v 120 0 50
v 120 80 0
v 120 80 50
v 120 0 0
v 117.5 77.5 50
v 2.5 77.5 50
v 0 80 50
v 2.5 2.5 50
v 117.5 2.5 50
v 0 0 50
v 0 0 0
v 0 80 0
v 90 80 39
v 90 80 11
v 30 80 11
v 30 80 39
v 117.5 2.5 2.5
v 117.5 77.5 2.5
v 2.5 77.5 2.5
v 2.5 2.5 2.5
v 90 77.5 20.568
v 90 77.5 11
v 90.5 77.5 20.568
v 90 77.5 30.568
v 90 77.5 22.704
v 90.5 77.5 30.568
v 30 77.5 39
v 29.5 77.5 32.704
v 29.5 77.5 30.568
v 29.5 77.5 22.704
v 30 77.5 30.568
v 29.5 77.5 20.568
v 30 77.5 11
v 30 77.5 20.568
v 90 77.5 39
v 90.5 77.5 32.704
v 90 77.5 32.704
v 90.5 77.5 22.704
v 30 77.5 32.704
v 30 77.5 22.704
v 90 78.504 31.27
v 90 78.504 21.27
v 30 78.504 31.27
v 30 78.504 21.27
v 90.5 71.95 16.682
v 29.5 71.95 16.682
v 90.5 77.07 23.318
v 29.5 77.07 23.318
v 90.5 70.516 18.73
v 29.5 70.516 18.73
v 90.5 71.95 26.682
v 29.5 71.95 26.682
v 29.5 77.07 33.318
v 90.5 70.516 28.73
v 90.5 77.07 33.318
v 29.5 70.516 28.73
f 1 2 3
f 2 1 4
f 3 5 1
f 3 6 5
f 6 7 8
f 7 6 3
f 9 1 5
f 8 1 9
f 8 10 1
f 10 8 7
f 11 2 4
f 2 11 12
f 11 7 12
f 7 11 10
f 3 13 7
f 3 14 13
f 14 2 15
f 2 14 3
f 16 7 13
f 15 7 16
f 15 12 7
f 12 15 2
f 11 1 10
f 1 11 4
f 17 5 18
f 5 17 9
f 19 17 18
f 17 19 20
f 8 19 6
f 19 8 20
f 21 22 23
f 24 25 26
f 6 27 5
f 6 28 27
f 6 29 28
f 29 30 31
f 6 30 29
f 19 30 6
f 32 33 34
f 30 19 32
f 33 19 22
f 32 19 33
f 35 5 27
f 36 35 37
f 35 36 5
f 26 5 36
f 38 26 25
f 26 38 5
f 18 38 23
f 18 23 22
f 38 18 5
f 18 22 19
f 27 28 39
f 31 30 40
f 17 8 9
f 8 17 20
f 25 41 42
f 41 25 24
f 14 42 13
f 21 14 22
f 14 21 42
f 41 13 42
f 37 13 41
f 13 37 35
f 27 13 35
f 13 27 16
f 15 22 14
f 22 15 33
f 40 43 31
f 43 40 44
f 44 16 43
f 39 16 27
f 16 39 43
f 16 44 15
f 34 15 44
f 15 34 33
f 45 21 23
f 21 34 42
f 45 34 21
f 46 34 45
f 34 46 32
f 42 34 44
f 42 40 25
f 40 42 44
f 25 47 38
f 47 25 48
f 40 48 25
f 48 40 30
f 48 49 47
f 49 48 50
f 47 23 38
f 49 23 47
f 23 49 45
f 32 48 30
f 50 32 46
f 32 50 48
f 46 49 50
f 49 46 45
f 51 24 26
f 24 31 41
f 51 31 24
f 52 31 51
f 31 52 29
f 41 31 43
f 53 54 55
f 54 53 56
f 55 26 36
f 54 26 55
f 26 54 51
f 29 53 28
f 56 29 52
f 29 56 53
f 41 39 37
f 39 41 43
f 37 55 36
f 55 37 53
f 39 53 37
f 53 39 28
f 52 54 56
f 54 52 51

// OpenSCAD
$fn = 32;

// ----------------------------------------------------------------------
// Vent box: louvers enclosure
// ----------------------------------------------------------------------

// --- parameters (mm) ---
box_l = 120;              // box length, X
box_w = 80;               // box width, Y
box_h = 50;               // box height, Z
wall_t = 2.5;             // shell wall thickness
win_l = 60;               // vent window width, X
win_h = 28;               // vent window height, Z
slat_t = 2.5;             // louver slat thickness
slat_d = 8;               // louver slat depth
slat_a = 35;              // louver slat angle, degrees
slat_pitch = 10;          // louver pitch
slat_yc = 74.51;          // slat centreline Y

win_z0 = (box_h - win_h) / 2;  // window lower edge Z
n_slats = 2;  // louver count
slat_z0 = win_z0 + (win_h - (n_slats - 1) * slat_pitch) / 2;

difference() {
  union() {
    difference() {
      cube([box_l, box_w, box_h]);
  translate([wall_t, wall_t, wall_t])
    cube([box_l - 2 * wall_t, box_w - 2 * wall_t, box_h]);
  translate([(box_l - win_l) / 2, box_w - wall_t - 1, win_z0])
    cube([win_l, wall_t + 2, win_h]);
    }
    for (i = [0 : n_slats - 1])
      translate([box_l / 2, slat_yc, slat_z0 + i * slat_pitch])
        rotate([slat_a, 0, 0])
          cube([win_l + 1, slat_d, slat_t], center = true);
  }
}
